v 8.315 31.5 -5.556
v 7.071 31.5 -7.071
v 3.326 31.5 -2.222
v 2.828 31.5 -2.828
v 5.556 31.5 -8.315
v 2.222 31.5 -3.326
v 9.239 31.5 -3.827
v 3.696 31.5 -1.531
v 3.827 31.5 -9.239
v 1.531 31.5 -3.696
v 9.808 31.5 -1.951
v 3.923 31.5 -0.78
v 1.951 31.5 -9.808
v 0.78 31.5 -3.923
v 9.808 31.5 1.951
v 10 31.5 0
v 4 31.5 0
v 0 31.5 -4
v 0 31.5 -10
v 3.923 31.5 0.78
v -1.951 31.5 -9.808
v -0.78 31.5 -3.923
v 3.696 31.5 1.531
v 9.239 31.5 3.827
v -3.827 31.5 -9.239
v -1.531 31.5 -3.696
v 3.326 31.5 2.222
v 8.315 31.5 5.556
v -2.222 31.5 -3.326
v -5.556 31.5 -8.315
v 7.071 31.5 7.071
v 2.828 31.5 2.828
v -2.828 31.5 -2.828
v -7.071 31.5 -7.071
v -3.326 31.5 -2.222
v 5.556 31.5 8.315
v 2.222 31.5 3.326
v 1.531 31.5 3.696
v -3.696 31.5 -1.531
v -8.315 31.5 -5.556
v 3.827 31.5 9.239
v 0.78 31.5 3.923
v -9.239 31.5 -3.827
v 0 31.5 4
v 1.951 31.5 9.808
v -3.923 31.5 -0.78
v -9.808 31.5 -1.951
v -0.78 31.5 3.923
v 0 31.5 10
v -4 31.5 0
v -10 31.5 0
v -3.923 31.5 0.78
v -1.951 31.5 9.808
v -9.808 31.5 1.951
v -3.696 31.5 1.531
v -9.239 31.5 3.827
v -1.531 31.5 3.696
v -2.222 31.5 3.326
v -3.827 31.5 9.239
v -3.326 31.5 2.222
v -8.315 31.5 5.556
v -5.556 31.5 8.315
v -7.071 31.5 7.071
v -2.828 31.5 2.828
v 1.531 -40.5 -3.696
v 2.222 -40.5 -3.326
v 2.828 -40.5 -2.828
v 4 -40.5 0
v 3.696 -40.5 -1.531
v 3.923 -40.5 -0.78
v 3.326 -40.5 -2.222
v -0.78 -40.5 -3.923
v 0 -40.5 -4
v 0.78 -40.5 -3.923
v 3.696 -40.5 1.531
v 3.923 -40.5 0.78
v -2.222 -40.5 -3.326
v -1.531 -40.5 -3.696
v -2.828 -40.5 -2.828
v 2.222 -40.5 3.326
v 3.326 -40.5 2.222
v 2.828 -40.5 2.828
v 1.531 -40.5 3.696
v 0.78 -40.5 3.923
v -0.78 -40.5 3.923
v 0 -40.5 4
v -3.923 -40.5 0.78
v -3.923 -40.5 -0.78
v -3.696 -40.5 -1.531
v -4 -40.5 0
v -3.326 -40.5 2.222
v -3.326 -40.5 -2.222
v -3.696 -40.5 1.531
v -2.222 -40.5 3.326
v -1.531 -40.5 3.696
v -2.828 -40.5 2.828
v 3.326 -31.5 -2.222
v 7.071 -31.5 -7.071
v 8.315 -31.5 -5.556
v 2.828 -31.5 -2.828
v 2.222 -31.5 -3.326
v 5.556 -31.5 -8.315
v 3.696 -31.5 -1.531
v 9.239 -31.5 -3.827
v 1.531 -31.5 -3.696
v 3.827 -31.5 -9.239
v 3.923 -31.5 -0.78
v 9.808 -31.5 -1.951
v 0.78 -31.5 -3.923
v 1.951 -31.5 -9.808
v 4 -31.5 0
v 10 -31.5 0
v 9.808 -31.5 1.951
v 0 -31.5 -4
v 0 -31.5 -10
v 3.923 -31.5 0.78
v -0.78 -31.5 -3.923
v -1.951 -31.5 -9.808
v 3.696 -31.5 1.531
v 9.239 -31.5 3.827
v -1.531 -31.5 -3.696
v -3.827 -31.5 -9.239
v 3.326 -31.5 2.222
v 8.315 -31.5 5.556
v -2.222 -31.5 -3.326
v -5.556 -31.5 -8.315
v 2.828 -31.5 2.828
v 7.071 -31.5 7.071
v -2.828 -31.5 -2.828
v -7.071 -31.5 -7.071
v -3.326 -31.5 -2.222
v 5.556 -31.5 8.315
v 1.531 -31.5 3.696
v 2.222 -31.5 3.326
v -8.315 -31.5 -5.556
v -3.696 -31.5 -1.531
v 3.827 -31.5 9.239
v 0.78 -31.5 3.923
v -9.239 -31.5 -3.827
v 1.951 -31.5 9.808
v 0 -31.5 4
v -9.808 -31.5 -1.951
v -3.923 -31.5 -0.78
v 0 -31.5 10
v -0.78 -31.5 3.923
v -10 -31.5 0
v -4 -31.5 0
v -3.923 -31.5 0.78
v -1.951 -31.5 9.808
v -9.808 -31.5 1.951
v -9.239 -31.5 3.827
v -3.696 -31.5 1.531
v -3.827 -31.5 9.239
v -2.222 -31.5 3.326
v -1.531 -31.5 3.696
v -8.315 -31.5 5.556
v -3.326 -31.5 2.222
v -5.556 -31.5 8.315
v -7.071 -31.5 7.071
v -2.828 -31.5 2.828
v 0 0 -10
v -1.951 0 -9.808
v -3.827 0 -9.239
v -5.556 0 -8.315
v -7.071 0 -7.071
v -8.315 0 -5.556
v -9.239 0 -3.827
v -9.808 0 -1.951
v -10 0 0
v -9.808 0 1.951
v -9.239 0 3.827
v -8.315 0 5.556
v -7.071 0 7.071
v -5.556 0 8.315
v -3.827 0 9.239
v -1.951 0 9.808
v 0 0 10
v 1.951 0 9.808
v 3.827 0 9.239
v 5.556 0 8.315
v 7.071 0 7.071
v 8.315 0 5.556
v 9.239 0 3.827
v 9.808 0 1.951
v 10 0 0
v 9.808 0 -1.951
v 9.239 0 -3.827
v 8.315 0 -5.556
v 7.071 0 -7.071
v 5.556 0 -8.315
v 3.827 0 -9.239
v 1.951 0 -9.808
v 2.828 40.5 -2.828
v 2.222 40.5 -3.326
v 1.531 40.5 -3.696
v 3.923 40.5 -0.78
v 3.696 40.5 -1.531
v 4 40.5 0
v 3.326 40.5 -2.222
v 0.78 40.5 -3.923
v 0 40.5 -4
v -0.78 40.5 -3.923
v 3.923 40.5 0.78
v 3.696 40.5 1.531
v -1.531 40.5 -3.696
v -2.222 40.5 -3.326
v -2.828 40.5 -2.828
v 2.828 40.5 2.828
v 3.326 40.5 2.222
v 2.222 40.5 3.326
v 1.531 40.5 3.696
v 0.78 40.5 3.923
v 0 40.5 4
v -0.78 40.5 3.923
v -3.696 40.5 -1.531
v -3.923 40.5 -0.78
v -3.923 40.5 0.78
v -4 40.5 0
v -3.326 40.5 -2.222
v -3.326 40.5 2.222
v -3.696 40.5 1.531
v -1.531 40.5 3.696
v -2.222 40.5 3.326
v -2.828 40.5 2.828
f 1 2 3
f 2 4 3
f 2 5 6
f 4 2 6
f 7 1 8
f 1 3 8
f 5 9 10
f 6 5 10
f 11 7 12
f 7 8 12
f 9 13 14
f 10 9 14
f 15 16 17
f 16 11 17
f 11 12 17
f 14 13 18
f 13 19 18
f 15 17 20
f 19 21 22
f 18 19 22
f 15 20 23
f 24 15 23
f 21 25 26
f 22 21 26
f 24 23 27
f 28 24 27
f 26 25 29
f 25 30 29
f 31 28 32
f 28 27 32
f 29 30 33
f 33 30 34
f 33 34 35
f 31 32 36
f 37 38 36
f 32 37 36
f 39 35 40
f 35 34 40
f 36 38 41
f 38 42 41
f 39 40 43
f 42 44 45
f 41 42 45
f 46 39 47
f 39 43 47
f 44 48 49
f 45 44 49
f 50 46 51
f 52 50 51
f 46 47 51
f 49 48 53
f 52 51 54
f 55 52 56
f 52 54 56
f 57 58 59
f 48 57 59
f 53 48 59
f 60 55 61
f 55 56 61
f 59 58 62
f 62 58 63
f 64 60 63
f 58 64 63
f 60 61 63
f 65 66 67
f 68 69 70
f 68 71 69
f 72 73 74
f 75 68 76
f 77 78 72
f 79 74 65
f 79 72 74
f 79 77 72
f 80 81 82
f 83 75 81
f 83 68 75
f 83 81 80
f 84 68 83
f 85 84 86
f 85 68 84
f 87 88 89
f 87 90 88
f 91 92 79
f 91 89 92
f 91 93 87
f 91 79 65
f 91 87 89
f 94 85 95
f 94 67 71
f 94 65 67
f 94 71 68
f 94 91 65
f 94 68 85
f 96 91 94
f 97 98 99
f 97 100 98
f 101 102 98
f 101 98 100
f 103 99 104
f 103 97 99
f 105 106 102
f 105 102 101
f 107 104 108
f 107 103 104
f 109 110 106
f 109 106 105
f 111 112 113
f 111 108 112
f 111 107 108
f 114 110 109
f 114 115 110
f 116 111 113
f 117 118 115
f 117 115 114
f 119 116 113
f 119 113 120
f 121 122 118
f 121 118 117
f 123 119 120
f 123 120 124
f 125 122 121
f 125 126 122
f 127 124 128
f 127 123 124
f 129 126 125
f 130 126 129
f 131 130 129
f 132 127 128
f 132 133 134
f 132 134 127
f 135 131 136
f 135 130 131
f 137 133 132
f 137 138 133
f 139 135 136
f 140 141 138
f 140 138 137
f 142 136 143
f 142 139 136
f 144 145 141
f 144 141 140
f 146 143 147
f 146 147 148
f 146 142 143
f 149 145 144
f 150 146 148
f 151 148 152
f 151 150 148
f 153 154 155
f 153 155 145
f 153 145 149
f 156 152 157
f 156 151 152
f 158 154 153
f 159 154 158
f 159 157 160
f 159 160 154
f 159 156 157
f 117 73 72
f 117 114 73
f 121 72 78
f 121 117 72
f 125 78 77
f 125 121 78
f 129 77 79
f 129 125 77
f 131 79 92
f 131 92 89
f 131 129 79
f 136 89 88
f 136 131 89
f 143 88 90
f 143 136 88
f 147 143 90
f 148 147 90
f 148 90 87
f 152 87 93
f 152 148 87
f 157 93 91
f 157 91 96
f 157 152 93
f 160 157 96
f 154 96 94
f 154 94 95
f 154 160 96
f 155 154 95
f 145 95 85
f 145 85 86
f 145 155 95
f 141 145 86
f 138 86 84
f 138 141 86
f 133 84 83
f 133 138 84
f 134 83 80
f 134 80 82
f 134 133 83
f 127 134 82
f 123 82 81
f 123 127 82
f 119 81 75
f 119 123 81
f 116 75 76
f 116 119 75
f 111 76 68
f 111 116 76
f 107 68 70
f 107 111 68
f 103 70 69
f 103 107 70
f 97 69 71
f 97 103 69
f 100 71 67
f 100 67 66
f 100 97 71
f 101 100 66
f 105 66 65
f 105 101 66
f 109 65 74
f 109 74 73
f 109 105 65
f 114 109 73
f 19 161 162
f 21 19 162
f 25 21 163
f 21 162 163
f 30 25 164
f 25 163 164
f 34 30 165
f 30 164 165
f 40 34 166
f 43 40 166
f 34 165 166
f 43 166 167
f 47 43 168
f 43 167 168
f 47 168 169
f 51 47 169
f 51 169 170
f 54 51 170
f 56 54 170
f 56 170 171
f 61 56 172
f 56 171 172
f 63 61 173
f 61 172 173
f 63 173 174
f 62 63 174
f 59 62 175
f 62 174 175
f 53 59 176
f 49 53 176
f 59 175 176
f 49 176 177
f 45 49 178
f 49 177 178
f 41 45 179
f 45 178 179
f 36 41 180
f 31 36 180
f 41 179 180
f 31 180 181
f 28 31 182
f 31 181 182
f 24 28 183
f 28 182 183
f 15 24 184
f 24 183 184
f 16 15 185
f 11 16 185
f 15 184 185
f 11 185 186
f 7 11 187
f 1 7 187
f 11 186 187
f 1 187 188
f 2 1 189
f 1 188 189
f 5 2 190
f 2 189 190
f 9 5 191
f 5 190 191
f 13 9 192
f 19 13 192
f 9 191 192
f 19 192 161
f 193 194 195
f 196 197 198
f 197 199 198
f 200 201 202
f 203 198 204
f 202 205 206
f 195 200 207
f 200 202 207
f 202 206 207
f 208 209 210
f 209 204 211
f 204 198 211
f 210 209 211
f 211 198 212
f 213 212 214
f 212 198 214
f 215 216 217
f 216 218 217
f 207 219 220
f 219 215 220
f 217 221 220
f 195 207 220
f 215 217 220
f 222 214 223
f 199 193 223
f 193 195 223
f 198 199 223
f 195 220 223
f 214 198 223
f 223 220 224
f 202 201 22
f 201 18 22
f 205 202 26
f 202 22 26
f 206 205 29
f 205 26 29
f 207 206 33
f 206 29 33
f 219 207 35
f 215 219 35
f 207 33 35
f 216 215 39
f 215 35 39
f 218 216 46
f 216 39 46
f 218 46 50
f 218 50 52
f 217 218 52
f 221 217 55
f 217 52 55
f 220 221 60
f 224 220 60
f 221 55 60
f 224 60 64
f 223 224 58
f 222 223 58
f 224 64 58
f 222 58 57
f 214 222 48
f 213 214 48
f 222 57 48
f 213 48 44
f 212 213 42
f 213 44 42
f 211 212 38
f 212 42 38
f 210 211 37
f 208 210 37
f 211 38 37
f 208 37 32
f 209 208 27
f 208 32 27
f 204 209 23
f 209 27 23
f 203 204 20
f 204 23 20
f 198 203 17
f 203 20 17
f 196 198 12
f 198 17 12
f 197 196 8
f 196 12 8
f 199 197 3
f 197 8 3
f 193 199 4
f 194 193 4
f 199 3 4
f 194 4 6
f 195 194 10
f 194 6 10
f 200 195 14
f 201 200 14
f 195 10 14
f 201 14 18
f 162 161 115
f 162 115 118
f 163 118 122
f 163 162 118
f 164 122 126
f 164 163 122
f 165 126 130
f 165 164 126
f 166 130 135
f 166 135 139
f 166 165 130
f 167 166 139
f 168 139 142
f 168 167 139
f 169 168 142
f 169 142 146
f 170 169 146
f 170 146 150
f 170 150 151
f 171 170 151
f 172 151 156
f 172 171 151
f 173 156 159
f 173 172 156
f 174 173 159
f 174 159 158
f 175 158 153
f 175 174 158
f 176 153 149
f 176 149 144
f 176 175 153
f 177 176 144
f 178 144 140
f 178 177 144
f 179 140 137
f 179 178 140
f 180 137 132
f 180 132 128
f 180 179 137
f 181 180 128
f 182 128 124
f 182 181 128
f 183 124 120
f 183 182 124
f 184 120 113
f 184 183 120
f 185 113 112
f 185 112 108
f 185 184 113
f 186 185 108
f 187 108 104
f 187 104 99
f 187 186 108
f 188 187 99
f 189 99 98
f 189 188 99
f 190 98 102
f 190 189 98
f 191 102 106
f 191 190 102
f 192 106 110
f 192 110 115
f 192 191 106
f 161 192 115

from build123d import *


with BuildPart() as part:
    # Эскиз1 → Повернуть1 (revolve)
    with BuildSketch(Plane(origin=(0, 0, 0), x_dir=(0, 0, -1), z_dir=(1, 0, 0))):
        Polygon((0, 0), (0, -40.5), (4, -40.5), (4, -31.5), (10, -31.5), (10, 0), align=None)
    revolve_1 = revolve(axis=Axis((0, -1000, 0), (0, 1, 0)))

    # Зеркальное отражение1: Повернуть1 across plane
    add(revolve_1.mirror(Plane(origin=(0, 0, -10), x_dir=(0, 0, 1), z_dir=(0, 1, 0))))


solid = part.part
